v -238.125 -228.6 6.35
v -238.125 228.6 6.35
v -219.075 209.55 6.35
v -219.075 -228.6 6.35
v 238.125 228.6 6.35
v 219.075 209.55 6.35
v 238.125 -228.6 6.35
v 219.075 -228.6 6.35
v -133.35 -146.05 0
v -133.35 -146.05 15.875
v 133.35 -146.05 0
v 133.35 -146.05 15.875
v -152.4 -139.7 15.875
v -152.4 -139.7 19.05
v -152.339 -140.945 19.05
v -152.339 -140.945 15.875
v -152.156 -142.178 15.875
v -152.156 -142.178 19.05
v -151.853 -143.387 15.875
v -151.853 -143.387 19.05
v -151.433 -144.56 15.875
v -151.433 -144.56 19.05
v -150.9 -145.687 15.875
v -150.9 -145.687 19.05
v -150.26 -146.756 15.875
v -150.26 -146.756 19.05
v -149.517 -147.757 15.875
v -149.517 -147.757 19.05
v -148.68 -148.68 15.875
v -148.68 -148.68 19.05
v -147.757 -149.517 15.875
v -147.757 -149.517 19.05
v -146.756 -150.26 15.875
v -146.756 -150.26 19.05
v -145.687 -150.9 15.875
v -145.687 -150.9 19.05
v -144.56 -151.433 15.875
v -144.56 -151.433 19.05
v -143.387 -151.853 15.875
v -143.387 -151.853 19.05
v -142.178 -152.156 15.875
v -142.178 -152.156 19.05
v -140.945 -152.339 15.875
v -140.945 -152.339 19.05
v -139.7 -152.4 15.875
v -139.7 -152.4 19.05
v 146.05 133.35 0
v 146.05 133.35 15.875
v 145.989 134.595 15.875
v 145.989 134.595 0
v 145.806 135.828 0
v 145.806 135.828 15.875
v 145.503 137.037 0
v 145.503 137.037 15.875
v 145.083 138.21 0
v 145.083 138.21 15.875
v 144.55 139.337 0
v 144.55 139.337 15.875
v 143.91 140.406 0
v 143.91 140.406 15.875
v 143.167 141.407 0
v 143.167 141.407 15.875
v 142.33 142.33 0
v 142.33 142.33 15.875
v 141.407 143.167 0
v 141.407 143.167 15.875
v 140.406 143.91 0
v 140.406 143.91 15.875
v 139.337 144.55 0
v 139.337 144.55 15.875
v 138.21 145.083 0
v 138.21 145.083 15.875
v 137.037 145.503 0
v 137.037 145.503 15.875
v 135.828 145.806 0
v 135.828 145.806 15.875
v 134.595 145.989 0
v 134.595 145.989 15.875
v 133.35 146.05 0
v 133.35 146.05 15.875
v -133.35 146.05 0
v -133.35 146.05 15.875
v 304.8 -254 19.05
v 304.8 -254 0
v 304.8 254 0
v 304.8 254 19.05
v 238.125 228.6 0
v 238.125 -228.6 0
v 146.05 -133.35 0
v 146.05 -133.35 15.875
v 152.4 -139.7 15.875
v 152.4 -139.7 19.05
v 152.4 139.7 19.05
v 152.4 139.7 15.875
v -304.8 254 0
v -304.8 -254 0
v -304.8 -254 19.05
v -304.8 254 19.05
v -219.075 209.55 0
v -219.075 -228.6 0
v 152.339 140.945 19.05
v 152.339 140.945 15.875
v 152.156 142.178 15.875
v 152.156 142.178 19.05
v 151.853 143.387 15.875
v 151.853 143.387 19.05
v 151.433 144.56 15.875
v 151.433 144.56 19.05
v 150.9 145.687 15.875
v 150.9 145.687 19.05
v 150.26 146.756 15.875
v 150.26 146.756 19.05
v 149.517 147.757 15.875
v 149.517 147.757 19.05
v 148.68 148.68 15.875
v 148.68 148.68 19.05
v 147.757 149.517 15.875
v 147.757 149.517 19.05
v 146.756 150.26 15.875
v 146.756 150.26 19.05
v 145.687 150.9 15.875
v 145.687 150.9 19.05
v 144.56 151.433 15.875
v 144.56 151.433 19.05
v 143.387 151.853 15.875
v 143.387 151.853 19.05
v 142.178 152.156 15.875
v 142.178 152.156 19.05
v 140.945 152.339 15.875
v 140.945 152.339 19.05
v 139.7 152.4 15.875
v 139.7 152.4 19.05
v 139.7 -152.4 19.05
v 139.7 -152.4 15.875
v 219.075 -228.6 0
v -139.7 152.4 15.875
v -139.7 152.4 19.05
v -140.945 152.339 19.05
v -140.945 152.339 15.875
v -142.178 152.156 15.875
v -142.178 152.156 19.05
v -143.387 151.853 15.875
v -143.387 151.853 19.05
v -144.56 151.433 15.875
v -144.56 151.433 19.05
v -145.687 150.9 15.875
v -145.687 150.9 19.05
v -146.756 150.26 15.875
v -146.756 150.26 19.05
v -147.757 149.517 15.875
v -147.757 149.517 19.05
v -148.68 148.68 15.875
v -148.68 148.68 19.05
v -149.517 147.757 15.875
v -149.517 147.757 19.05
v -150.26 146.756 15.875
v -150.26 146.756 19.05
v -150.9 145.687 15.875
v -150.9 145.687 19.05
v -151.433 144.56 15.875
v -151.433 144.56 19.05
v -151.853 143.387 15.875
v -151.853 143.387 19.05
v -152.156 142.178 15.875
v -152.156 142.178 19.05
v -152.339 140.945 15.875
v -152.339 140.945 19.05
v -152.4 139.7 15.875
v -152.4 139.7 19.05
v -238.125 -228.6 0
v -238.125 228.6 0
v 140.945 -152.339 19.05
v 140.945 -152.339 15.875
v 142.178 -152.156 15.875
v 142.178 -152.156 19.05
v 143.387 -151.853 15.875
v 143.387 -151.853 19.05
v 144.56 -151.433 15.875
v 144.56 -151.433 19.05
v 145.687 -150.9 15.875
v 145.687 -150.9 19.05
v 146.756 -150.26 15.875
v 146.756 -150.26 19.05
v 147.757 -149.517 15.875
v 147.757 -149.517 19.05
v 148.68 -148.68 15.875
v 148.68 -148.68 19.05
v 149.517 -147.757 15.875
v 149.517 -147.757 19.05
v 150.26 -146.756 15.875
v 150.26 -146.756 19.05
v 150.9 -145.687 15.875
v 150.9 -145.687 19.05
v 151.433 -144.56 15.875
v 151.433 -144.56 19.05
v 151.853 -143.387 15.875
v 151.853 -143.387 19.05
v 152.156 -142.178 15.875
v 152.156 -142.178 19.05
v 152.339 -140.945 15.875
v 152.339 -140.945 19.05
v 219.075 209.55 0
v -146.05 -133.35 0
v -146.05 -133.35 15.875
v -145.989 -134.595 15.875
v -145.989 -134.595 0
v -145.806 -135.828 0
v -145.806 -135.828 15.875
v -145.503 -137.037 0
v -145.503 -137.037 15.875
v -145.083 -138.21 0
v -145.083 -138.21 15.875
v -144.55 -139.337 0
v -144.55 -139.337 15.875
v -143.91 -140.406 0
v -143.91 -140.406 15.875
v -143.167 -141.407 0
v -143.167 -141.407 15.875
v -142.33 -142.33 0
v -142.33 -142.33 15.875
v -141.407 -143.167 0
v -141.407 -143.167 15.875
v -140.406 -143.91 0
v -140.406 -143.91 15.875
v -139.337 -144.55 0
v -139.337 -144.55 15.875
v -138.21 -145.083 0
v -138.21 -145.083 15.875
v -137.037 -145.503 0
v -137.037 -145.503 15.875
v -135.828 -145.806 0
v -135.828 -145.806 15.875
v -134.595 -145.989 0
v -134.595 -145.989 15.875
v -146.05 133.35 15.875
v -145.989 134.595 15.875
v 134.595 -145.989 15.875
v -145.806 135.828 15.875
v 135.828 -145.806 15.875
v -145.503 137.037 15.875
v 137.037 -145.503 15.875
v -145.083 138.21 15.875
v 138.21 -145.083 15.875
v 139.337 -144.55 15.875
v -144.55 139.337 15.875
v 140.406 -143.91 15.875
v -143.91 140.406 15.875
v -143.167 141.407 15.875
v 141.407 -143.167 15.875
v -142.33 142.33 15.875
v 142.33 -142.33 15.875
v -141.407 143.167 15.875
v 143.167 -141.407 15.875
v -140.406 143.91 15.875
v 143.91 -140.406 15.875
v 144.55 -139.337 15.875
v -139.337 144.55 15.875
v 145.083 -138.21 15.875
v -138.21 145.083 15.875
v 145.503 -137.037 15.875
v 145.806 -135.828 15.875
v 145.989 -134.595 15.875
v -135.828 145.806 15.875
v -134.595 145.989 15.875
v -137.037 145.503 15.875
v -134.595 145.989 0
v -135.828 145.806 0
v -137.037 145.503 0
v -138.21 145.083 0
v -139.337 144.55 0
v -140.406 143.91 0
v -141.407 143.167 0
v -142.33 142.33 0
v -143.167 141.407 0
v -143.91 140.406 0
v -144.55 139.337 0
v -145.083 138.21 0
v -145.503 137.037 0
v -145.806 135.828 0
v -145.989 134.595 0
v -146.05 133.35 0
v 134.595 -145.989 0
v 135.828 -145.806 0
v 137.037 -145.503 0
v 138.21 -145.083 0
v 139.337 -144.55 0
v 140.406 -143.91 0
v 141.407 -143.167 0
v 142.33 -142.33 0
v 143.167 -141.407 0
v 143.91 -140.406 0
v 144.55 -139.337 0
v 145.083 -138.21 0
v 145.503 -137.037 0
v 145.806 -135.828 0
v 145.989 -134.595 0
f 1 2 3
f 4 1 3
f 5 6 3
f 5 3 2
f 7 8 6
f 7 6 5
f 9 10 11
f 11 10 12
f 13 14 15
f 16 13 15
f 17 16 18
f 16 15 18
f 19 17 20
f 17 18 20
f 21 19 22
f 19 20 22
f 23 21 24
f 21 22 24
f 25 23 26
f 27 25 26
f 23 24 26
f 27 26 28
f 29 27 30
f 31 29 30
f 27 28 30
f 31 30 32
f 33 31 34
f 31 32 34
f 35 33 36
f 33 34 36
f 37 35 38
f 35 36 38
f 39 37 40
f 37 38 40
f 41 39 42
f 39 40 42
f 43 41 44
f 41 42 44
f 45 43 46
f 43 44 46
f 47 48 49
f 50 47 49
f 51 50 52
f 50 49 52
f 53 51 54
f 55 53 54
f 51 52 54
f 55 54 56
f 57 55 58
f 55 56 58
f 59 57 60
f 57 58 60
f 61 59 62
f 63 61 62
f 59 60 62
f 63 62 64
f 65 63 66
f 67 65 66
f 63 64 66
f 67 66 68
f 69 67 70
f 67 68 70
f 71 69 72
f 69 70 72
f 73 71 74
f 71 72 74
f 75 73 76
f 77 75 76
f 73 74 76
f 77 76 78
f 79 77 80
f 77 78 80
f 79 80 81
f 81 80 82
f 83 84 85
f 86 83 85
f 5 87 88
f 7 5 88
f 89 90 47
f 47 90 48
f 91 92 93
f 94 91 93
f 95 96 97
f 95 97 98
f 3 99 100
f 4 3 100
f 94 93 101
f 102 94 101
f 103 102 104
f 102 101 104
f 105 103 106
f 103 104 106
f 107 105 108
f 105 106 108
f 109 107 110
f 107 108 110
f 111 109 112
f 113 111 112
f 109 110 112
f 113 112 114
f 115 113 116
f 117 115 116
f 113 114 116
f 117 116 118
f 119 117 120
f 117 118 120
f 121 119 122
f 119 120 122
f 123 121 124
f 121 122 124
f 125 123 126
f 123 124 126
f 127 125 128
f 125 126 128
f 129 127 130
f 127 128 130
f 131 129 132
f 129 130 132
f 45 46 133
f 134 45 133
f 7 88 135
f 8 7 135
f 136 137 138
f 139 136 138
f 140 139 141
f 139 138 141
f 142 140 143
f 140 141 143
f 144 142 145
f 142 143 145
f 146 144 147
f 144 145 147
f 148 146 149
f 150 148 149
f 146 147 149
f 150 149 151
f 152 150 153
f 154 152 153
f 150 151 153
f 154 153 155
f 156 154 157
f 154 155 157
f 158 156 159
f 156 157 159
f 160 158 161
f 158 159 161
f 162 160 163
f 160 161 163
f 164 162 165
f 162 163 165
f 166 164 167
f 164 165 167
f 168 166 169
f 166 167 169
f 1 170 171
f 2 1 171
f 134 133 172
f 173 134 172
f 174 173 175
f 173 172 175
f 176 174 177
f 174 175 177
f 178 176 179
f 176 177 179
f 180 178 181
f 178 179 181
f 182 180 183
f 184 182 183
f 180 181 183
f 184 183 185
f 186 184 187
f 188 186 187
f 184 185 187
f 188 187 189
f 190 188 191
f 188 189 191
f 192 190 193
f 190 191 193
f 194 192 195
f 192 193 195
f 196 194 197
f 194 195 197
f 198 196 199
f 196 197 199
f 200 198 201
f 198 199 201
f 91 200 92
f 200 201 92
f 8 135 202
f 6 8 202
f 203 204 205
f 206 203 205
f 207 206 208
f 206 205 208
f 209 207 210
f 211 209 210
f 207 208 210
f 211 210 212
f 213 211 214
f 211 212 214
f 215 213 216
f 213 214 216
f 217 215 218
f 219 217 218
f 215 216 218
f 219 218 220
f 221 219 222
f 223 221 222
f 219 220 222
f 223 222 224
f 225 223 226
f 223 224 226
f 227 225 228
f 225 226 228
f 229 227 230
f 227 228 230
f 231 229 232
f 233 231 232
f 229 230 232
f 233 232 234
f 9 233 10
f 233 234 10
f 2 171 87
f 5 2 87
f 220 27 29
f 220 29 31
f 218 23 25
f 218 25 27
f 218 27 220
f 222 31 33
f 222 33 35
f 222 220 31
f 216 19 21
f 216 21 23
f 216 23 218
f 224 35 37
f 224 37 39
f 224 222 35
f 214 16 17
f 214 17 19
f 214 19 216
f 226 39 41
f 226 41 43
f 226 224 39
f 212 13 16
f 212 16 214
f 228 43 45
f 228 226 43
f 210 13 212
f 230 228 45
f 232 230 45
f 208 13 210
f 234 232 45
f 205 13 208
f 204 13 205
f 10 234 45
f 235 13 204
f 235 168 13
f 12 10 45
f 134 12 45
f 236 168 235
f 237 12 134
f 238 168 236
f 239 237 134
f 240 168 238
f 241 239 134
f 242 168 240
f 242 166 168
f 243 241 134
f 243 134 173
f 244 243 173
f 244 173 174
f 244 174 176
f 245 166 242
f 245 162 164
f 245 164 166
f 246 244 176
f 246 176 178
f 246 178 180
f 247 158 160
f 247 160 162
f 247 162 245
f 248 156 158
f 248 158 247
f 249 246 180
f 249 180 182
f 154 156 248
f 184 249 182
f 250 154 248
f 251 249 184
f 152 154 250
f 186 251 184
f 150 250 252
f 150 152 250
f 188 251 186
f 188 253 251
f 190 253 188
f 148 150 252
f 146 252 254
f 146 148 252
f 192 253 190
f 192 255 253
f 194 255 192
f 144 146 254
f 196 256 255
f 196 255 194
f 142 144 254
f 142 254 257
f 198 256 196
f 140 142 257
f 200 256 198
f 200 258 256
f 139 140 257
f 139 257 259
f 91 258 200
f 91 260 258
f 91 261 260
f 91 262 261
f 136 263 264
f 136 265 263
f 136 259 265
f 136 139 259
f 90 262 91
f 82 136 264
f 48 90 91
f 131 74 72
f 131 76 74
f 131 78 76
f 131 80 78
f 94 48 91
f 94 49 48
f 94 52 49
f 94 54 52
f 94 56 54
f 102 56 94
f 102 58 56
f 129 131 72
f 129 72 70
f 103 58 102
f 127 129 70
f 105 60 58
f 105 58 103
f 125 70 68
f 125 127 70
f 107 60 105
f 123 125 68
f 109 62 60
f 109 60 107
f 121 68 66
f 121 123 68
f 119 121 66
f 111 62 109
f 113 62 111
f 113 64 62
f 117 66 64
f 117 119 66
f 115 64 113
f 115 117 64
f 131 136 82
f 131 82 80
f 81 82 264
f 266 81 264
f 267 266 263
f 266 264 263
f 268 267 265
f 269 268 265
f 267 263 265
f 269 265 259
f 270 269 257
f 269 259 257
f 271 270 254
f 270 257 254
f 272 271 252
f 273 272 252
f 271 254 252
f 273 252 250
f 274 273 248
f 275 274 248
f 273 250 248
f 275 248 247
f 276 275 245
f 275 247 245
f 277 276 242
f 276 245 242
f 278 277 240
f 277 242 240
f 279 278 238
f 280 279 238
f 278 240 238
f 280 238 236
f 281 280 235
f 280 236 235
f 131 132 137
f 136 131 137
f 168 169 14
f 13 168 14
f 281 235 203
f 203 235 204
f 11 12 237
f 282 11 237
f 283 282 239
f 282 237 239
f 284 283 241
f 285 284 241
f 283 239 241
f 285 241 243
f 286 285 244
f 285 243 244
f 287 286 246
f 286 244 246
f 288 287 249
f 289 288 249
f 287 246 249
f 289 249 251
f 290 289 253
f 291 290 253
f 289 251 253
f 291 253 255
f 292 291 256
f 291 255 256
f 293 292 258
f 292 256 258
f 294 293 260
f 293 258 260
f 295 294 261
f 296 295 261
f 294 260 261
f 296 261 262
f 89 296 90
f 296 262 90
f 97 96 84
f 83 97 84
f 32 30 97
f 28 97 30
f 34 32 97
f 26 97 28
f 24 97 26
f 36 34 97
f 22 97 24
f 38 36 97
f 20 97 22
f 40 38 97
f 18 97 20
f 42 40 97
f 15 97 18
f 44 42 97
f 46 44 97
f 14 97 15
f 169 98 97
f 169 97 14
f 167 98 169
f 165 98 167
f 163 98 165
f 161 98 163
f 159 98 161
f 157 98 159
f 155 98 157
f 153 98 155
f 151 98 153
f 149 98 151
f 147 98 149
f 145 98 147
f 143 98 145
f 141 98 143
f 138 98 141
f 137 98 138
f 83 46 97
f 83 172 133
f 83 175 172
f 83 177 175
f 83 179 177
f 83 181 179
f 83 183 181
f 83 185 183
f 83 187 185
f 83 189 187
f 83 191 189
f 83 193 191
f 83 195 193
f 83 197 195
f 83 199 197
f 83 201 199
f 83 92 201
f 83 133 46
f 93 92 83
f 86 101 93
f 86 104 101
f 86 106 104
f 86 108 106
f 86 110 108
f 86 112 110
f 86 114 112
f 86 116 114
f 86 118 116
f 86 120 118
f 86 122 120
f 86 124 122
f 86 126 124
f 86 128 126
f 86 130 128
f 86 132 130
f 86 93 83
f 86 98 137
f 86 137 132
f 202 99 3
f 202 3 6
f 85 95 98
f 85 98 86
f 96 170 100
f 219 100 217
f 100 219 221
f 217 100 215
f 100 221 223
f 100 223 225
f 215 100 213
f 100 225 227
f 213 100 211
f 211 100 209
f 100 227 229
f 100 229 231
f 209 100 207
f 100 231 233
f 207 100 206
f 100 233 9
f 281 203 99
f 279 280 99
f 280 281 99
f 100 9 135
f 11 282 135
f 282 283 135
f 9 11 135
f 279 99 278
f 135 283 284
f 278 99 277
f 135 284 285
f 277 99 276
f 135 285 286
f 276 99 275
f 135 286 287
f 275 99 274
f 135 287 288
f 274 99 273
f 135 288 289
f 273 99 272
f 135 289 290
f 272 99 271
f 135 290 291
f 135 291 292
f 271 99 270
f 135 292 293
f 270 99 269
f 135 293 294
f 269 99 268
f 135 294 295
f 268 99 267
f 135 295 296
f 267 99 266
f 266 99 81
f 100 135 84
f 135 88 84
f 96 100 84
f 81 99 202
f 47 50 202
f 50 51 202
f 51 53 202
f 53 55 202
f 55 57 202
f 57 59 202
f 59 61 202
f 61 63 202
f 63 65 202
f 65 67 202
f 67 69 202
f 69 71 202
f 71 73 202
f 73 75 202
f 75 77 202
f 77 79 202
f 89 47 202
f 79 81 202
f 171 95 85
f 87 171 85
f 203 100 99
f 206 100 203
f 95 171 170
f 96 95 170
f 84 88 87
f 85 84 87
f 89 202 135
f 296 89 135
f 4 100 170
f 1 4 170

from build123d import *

# Parameters (mm, degrees)
F0_W     = 609.6
F0_H     = 508
F1_DEPTH = 19.05
F3_DEPTH = 3.175
F5_DEPTH = 19.05
F6_W     = 438.15
F6_H     = 19.05
F7_DEPTH = 6.35


# Not quite as in the source:
# - a length typed as a fraction of an inch, garbled in the dataset ("3 / 203.2 mm" for 3/8 in), is restored


with BuildPart() as f1:
    # F0 (on Top) → F1 (new body)
    with BuildSketch(Plane.XY):
        Rectangle(F0_W, F0_H)
    extrude(amount=F1_DEPTH)

    # F2 (on face) → F3 (cut)
    with BuildSketch(Plane.XY.offset(19.05)):
        with BuildLine():
            ThreePointArc((152.4, 139.7), (148.6802561211, 148.6802561211), (139.7, 152.4))
            Line((139.7, 152.4), (-139.7, 152.4))
            ThreePointArc((-139.7, 152.4), (-148.6802561211, 148.6802561211), (-152.4, 139.7))
            Line((-152.4, 139.7), (-152.4, -139.7))
            ThreePointArc((-152.4, -139.7), (-148.6802561211, -148.6802561211), (-139.7, -152.4))
            Line((-139.7, -152.4), (139.7, -152.4))
            ThreePointArc((139.7, -152.4), (148.6802561211, -148.6802561211), (152.4, -139.7))
            Line((152.4, -139.7), (152.4, 139.7))
        make_face()
    extrude(amount=-F3_DEPTH, mode=Mode.SUBTRACT)

    # F4 (on face) → F5 (cut)
    with BuildSketch(Plane.XY.offset(15.875)):
        with BuildLine():
            ThreePointArc((146.05, 133.35), (142.3302561211, 142.3302561211), (133.35, 146.05))
            Line((133.35, 146.05), (-133.35, 146.05))
            ThreePointArc((-133.35, 146.05), (-142.3302561211, 142.3302561211), (-146.05, 133.35))
            Line((-146.05, 133.35), (-146.05, -133.35))
            ThreePointArc((-146.05, -133.35), (-142.3302561211, -142.3302561211), (-133.35, -146.05))
            Line((-133.35, -146.05), (133.35, -146.05))
            ThreePointArc((133.35, -146.05), (142.3302561211, -142.3302561211), (146.05, -133.35))
            Line((146.05, -133.35), (146.05, 133.35))
        make_face()
    extrude(amount=-F5_DEPTH, mode=Mode.SUBTRACT)

    # F6 (on face) → F7 (cut)
    with BuildSketch(Plane(origin=(0, 0, 0), x_dir=(1, 0, 0), z_dir=(0, 0, -1))):
        Polygon((-219.075, 228.6), (-238.125, 228.6), (-238.125, -228.6), (-219.075, -228.6), (-219.075, -209.55), align=None)
        with Locations((0, -219.075)):
            Rectangle(F6_W, F6_H)
        Polygon((219.075, 228.6), (219.075, -209.55), (219.075, -228.6), (238.125, -228.6), (238.125, 228.6), align=None)
    extrude(amount=-F7_DEPTH, mode=Mode.SUBTRACT)


solid = f1.part
